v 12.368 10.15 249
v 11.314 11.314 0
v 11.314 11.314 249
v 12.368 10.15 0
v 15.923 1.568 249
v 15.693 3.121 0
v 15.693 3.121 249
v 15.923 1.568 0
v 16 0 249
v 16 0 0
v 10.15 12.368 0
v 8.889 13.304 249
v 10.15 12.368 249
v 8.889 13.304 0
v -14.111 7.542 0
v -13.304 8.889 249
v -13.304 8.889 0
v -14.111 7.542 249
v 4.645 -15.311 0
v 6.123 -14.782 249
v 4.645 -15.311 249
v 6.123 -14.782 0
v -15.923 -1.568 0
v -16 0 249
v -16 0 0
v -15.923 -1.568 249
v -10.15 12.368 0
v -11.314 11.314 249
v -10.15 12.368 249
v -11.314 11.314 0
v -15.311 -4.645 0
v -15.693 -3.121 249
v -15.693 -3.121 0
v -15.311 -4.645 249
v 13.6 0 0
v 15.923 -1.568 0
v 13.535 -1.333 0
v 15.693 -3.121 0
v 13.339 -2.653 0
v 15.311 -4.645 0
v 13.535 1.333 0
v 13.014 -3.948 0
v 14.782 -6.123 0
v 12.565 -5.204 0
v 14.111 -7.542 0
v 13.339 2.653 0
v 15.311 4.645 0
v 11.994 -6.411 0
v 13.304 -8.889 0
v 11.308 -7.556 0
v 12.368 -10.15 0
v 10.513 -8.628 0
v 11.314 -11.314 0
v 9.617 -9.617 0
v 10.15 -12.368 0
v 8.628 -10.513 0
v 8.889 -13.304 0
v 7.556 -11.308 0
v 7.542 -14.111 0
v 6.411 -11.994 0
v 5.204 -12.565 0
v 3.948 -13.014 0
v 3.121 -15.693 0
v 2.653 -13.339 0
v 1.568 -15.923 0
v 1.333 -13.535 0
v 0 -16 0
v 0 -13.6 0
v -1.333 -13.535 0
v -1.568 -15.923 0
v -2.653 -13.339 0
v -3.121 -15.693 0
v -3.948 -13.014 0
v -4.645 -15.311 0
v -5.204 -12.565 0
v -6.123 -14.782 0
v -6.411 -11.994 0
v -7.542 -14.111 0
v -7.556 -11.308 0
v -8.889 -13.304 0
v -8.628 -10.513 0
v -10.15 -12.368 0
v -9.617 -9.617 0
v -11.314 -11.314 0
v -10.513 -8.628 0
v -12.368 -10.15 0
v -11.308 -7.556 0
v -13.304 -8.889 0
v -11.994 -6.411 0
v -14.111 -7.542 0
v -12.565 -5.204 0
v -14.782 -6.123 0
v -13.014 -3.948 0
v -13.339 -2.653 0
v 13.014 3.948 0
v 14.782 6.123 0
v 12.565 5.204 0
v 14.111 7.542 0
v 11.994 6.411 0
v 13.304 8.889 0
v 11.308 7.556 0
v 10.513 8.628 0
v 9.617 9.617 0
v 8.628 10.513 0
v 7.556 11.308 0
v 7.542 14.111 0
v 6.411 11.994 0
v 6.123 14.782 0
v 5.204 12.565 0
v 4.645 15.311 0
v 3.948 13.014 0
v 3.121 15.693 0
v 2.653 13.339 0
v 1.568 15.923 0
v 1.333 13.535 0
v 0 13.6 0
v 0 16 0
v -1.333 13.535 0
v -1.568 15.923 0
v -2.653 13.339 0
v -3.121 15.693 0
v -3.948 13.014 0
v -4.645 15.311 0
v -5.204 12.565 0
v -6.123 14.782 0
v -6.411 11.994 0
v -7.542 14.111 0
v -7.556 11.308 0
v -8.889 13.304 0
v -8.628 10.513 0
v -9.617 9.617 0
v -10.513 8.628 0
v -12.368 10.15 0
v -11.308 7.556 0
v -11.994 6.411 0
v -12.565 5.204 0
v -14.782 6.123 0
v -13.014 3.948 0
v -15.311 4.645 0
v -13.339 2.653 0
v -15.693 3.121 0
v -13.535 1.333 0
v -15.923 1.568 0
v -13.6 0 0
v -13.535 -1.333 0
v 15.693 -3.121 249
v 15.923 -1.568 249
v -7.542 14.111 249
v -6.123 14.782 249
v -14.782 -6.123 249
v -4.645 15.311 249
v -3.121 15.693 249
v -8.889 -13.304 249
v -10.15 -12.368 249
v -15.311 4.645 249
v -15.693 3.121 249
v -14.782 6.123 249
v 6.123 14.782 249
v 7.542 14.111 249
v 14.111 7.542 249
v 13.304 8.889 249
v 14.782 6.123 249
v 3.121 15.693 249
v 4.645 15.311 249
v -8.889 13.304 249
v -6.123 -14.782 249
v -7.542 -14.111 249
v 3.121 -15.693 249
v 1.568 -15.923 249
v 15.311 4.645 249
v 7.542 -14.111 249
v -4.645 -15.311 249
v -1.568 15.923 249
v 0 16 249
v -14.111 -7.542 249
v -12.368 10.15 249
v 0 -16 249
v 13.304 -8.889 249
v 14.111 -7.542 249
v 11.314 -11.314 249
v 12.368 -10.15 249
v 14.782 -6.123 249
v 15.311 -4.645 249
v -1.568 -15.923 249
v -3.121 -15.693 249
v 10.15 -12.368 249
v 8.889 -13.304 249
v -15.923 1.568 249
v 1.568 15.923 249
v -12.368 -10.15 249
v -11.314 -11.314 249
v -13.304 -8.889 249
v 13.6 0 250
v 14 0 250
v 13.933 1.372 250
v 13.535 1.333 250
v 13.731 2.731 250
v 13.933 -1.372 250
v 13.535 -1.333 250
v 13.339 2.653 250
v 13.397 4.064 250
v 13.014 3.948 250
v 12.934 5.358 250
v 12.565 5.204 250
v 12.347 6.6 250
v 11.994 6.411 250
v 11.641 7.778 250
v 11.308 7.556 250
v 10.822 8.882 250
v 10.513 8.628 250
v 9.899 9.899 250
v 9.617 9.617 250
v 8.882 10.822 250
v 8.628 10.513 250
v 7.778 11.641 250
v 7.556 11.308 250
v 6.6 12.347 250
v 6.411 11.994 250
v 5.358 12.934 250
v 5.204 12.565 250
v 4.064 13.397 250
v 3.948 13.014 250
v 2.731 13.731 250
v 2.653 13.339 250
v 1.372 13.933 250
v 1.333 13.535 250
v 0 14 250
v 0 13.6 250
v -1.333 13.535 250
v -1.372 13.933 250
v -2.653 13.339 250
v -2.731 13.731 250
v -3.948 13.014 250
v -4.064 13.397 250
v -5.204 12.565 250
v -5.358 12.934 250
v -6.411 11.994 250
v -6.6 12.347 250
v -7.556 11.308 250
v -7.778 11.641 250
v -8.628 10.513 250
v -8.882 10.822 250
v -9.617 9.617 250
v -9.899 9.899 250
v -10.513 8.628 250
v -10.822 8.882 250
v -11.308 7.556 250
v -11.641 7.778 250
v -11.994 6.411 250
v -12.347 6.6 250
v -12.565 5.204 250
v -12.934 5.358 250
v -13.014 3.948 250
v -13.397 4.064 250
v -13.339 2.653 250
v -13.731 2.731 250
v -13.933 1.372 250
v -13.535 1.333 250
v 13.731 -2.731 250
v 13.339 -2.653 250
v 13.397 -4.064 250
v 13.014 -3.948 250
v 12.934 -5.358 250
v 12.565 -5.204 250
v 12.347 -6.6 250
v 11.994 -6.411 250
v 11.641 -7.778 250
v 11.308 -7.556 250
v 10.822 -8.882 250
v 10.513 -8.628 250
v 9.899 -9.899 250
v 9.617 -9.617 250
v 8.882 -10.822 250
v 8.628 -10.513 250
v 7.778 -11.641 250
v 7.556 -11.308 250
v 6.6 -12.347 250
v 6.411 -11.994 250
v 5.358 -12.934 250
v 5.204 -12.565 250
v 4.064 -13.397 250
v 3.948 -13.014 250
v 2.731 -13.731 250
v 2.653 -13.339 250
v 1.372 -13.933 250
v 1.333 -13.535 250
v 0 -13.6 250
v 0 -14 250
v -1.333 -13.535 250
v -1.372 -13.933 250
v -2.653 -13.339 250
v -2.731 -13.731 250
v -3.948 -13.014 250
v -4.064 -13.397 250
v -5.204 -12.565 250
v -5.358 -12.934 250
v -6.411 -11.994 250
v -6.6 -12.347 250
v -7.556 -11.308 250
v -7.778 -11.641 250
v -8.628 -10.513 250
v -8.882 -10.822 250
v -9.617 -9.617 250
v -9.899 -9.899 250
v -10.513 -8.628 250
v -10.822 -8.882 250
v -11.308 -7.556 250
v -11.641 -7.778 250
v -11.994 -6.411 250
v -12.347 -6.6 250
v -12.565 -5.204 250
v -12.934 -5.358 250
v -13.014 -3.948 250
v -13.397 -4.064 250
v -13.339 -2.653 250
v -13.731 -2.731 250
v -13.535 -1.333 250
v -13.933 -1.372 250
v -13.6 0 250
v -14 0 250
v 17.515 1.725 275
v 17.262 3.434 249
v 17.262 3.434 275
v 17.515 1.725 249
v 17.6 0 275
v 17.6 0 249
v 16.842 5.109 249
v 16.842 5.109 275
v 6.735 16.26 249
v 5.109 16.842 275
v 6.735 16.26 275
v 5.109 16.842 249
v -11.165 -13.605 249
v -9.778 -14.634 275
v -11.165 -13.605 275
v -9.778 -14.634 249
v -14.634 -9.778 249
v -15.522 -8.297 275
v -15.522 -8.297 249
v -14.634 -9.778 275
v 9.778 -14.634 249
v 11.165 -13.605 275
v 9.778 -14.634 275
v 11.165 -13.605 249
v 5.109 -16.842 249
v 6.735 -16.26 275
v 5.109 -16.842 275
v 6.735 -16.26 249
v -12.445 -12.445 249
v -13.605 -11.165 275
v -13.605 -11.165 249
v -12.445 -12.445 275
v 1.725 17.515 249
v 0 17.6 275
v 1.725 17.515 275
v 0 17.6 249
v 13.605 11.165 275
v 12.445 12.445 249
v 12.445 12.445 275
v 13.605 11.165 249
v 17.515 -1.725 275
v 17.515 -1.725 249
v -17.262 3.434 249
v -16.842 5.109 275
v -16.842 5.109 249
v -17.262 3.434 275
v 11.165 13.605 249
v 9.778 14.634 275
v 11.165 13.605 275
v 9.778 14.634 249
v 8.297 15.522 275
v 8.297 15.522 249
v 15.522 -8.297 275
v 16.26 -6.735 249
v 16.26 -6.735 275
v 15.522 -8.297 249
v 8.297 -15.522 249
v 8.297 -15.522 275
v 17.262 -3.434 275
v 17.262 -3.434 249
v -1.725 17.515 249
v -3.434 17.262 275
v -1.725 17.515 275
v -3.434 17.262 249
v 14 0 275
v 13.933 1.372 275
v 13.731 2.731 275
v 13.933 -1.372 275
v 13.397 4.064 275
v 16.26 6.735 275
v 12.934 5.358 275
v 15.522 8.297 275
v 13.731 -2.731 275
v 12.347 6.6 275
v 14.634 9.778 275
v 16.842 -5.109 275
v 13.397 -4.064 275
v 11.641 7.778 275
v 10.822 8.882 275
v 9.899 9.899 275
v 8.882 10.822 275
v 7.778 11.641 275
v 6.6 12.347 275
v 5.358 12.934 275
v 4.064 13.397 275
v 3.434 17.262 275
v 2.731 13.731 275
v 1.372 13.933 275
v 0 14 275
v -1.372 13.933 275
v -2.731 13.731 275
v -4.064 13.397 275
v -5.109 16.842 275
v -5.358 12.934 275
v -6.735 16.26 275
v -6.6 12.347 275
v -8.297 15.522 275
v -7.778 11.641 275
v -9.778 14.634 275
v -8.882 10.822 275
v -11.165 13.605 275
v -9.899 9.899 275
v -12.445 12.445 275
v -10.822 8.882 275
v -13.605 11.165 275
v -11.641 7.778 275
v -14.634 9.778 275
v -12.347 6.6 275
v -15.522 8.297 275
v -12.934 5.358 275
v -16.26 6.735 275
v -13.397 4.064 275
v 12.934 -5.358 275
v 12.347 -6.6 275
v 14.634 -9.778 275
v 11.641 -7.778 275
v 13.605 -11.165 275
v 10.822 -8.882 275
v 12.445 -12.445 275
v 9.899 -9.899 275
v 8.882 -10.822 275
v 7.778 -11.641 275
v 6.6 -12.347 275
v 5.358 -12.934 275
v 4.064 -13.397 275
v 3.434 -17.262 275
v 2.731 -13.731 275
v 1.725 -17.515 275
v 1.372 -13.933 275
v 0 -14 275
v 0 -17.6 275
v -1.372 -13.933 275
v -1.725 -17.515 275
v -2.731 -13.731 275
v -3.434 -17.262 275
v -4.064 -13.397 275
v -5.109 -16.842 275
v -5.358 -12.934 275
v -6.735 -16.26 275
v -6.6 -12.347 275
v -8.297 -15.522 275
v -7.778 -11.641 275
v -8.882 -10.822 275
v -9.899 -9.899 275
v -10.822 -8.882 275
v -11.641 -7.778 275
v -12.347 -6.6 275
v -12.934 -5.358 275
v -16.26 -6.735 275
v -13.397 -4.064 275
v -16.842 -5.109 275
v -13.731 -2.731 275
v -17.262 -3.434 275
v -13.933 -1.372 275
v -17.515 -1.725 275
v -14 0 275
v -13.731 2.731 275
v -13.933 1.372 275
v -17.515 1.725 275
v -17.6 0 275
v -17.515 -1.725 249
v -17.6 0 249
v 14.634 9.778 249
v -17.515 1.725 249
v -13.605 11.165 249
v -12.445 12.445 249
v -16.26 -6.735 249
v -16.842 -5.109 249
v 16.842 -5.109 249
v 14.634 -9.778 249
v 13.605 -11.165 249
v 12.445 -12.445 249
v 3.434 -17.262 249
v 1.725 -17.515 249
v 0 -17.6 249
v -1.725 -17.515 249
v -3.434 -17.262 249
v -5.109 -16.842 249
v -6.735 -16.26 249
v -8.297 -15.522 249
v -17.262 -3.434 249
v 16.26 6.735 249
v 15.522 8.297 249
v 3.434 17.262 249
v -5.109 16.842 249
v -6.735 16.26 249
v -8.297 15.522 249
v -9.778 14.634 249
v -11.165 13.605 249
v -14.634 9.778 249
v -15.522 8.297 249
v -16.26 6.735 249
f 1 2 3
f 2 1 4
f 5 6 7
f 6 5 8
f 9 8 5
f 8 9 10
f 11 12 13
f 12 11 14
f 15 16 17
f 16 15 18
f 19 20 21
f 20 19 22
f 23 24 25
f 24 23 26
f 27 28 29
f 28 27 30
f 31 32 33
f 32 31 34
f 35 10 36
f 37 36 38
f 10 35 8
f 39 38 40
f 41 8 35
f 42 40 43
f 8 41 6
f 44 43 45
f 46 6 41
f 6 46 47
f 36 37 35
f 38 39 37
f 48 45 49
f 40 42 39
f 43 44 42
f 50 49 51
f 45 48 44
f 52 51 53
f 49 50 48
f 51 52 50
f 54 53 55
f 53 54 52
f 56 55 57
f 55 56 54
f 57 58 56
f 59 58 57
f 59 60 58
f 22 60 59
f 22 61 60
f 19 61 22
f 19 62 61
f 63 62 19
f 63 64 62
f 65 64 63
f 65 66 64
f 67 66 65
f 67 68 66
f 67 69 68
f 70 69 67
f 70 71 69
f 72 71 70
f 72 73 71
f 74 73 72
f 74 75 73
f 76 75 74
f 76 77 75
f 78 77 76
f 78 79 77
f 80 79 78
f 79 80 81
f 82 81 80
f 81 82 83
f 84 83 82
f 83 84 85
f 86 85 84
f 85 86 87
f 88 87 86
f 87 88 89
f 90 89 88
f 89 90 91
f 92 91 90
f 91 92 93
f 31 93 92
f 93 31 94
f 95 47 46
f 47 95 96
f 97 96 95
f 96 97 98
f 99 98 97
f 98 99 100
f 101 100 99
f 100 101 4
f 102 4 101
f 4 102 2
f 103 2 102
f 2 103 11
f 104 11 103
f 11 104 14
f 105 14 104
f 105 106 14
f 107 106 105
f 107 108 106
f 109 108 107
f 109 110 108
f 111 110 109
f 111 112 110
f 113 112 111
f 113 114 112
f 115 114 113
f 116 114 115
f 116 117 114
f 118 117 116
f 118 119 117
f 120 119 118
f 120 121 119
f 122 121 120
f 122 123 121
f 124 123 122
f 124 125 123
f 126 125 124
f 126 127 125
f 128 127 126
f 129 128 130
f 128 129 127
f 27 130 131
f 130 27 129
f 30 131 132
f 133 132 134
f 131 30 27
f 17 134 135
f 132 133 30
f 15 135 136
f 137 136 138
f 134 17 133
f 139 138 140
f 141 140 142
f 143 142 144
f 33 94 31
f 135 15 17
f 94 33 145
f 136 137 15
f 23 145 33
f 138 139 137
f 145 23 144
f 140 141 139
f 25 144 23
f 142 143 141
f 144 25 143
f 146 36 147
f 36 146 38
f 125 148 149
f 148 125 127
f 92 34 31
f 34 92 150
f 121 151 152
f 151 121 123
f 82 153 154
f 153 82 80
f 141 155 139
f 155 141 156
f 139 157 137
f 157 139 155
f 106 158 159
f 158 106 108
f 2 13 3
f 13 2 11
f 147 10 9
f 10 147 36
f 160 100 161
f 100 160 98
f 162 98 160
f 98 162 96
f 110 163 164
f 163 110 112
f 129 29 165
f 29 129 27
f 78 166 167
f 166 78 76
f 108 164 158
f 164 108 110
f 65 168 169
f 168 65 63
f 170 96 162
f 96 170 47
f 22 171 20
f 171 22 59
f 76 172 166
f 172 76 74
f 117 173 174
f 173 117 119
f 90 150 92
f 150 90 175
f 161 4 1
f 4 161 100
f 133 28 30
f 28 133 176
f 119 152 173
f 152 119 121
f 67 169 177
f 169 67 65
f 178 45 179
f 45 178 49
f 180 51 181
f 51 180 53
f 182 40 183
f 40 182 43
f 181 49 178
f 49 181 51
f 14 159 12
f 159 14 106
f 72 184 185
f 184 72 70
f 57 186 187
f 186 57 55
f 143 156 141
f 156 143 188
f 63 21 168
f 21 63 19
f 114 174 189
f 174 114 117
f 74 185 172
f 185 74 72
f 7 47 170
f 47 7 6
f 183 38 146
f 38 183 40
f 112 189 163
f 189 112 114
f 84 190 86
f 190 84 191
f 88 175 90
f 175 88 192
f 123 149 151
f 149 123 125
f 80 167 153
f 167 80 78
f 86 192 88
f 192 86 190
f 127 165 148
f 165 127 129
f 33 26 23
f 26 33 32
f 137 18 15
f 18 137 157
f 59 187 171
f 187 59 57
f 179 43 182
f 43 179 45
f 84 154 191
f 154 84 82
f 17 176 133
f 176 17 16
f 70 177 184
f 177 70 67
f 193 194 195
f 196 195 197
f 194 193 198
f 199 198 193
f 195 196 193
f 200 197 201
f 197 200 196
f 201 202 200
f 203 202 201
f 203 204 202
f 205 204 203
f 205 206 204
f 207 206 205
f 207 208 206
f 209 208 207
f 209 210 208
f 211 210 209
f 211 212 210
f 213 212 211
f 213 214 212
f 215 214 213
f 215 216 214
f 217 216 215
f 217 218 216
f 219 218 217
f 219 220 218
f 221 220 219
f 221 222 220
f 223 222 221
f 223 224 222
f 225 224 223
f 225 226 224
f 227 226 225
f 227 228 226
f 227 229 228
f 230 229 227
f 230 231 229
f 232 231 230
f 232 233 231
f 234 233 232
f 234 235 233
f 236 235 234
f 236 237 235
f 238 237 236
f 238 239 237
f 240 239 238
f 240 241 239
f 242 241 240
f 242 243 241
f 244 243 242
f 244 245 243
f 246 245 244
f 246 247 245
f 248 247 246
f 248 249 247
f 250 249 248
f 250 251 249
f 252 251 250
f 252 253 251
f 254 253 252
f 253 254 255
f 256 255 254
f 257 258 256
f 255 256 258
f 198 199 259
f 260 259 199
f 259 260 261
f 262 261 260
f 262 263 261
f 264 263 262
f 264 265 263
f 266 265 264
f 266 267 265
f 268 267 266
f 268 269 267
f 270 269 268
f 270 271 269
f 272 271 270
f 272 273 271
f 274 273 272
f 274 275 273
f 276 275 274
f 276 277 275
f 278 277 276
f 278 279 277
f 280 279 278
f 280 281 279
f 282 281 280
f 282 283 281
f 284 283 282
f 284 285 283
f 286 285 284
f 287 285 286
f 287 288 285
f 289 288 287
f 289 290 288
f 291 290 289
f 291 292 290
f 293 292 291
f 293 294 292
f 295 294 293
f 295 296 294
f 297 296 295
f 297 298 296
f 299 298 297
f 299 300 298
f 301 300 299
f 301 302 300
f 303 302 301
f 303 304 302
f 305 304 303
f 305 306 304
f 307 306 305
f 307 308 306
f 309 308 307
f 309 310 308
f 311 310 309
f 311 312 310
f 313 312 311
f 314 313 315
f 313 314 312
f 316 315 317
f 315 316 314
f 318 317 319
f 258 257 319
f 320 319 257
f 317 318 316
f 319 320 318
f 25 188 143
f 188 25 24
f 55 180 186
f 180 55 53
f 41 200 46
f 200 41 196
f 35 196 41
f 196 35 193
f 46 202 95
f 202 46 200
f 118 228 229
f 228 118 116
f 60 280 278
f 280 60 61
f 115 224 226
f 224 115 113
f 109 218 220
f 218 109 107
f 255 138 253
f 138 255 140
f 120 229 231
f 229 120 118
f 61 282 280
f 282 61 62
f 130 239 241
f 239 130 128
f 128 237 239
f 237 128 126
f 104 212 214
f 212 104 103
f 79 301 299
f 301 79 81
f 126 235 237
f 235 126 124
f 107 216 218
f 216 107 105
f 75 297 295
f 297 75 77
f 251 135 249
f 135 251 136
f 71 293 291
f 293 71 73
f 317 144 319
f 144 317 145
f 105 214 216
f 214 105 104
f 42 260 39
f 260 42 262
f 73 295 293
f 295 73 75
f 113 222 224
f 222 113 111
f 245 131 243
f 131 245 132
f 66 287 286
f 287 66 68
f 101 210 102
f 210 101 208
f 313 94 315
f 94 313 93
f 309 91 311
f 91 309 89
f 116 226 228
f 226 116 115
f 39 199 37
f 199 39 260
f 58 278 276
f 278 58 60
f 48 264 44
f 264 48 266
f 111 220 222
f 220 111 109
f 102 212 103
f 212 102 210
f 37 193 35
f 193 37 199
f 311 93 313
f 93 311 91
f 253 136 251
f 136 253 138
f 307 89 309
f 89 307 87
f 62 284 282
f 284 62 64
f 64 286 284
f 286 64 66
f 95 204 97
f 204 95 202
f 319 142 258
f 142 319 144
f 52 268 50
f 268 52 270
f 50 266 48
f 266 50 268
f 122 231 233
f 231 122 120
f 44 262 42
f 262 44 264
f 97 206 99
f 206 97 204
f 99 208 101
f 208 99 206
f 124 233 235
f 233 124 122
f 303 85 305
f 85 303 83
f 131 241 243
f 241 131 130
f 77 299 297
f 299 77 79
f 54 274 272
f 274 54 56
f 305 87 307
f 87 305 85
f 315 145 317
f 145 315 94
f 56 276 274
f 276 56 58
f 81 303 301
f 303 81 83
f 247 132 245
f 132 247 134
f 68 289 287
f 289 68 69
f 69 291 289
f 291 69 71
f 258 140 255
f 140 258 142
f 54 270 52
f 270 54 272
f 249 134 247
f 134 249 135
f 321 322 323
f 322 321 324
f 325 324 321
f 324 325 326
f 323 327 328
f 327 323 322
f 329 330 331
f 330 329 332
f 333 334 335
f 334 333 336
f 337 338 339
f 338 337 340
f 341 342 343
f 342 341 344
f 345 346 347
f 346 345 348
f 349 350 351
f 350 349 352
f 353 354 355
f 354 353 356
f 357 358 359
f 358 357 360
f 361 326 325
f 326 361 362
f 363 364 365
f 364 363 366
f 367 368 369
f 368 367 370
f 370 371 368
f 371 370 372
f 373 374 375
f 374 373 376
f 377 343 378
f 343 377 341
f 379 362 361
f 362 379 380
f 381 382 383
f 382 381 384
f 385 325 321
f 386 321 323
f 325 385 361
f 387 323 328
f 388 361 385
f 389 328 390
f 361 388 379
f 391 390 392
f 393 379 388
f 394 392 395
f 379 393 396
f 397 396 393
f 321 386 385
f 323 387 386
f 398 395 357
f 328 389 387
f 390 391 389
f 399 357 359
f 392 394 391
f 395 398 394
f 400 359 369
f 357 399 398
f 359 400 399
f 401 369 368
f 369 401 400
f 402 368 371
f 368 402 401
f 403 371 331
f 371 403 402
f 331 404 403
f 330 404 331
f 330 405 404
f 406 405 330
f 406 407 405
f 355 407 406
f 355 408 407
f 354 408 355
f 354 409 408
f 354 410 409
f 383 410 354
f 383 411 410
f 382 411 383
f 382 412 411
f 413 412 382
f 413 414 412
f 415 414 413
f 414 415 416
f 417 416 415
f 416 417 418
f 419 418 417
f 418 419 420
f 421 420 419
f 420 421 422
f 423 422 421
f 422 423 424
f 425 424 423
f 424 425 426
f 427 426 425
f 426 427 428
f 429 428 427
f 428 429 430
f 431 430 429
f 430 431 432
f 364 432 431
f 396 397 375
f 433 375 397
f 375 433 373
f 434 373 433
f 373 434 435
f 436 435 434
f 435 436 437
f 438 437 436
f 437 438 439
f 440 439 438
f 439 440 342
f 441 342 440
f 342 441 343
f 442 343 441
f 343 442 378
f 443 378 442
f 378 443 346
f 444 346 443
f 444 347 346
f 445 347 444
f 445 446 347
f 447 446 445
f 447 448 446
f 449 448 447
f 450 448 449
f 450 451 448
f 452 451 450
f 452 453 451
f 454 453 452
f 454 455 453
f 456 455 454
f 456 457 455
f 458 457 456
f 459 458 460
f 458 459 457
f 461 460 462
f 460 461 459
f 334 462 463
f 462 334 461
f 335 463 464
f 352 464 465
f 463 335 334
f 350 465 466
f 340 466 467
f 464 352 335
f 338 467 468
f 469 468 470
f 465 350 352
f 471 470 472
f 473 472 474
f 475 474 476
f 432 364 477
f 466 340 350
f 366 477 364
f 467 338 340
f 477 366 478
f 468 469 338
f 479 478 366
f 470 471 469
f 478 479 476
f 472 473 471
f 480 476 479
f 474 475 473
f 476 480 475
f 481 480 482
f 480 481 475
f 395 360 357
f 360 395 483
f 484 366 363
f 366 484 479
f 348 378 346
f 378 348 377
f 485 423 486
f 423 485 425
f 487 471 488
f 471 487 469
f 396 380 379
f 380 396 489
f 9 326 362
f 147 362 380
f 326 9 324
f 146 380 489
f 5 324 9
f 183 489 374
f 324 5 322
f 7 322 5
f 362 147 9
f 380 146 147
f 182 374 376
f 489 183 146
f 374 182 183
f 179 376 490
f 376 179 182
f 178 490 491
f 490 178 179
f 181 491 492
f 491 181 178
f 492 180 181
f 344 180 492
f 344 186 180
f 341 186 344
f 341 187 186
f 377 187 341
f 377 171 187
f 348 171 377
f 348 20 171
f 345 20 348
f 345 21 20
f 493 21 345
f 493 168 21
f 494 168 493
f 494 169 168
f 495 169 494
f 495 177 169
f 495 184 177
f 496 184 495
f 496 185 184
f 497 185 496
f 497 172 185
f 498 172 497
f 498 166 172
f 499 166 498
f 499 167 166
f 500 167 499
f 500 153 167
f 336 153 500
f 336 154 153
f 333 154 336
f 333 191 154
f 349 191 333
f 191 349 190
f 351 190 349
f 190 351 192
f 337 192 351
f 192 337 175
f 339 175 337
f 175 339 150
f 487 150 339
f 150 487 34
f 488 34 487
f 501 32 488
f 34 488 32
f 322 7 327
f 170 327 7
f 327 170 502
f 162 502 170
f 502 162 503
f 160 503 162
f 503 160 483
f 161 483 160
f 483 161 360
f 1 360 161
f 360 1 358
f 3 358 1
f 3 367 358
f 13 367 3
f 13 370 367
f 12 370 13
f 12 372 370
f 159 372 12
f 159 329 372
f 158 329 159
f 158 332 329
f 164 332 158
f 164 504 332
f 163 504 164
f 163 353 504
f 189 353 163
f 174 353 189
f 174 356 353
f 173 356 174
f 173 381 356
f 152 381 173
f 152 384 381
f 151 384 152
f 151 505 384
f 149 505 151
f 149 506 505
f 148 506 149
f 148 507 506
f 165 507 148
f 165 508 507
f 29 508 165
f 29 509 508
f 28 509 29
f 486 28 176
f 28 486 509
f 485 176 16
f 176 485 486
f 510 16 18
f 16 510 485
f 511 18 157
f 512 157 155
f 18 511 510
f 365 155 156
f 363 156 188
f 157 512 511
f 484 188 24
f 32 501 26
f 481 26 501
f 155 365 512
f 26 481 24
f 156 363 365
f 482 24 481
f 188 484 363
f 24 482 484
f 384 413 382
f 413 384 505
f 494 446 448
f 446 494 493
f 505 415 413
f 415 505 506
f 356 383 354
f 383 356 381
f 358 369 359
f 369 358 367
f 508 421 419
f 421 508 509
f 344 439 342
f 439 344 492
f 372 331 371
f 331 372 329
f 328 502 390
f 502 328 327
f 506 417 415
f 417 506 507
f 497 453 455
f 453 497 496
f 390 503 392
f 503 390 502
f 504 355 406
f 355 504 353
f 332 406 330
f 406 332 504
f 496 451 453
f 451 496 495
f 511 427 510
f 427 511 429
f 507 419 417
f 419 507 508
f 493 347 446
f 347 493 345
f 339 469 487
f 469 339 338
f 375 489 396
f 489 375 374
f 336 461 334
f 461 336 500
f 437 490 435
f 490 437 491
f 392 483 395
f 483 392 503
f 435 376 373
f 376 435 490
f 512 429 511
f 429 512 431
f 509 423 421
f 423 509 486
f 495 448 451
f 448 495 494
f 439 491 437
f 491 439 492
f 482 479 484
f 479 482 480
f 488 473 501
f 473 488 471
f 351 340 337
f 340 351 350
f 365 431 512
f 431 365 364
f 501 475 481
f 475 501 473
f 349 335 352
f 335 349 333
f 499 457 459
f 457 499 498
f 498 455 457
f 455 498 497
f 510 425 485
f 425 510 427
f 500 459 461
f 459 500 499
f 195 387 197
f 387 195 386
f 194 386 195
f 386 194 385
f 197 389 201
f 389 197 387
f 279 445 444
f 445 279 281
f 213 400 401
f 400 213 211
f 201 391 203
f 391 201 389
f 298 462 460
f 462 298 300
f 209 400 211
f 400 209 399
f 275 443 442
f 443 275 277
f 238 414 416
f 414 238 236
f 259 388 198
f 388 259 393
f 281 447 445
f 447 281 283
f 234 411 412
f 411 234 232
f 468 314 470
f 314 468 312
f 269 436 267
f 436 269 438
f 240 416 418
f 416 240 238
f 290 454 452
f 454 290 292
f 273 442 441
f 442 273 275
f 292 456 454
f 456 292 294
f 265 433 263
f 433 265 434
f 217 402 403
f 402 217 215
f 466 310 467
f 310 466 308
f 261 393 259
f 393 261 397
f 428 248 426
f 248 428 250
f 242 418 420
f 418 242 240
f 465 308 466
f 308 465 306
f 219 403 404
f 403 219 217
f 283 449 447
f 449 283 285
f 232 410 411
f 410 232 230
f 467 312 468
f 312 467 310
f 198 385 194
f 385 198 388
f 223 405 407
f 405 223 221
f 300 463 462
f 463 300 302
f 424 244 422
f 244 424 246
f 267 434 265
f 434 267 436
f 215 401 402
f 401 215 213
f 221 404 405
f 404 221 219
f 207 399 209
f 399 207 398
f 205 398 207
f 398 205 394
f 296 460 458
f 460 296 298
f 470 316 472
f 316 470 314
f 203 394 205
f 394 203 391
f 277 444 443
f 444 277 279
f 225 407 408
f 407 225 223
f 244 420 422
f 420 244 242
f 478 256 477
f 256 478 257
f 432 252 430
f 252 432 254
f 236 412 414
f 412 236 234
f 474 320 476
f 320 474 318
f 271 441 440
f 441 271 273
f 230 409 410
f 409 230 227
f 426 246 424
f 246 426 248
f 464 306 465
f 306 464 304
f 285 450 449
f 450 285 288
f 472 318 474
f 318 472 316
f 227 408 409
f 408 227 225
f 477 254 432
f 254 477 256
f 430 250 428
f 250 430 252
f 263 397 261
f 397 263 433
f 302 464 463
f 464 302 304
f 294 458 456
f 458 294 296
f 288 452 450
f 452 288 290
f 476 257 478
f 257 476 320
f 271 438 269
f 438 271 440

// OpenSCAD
// Parameters
pipe_standard = 1; //[1:1:1]
nominal_diameter_mm = 32; //[16:64:1]
length_mm = 250; //[125:500:1]
wall_thickness_mm = 2.4; //[1.2:4.8:0.1]
socket_length_mm = 25; //[12.5:50:0.5]
socket_wall_extra_mm = 1.6; //[0.8:3.2:0.1]
socket_clearance_mm = 0.4; //[0.2:1.0:0.05]
overlap_mm = 1; //[0.5:2:0.1]

// HT Pipe - complete geometry
module ht_pipe() {
  color([0.85, 0.85, 0.8]) { // PVC color
    union() {
      // Pipe body
      difference() {
        translate([0, 0, 0])
          cylinder(h=length_mm, r=nominal_diameter_mm/2, $fn=64);
        translate([0, 0, -overlap_mm/2])
          cylinder(h=length_mm + overlap_mm, r=nominal_diameter_mm/2 - wall_thickness_mm, $fn=64);
      }
      // End fitting
      difference() {
        translate([0, 0, length_mm - overlap_mm])
          cylinder(h=socket_length_mm + overlap_mm, r=nominal_diameter_mm/2 + socket_wall_extra_mm, $fn=64);
        translate([0, 0, length_mm - overlap_mm*2])
          cylinder(h=socket_length_mm + overlap_mm*2, r=nominal_diameter_mm/2 - wall_thickness_mm + socket_clearance_mm, $fn=64);
      }
    }
  }
}

// Assembly
module assembly() {
  ht_pipe();
}

assembly();
